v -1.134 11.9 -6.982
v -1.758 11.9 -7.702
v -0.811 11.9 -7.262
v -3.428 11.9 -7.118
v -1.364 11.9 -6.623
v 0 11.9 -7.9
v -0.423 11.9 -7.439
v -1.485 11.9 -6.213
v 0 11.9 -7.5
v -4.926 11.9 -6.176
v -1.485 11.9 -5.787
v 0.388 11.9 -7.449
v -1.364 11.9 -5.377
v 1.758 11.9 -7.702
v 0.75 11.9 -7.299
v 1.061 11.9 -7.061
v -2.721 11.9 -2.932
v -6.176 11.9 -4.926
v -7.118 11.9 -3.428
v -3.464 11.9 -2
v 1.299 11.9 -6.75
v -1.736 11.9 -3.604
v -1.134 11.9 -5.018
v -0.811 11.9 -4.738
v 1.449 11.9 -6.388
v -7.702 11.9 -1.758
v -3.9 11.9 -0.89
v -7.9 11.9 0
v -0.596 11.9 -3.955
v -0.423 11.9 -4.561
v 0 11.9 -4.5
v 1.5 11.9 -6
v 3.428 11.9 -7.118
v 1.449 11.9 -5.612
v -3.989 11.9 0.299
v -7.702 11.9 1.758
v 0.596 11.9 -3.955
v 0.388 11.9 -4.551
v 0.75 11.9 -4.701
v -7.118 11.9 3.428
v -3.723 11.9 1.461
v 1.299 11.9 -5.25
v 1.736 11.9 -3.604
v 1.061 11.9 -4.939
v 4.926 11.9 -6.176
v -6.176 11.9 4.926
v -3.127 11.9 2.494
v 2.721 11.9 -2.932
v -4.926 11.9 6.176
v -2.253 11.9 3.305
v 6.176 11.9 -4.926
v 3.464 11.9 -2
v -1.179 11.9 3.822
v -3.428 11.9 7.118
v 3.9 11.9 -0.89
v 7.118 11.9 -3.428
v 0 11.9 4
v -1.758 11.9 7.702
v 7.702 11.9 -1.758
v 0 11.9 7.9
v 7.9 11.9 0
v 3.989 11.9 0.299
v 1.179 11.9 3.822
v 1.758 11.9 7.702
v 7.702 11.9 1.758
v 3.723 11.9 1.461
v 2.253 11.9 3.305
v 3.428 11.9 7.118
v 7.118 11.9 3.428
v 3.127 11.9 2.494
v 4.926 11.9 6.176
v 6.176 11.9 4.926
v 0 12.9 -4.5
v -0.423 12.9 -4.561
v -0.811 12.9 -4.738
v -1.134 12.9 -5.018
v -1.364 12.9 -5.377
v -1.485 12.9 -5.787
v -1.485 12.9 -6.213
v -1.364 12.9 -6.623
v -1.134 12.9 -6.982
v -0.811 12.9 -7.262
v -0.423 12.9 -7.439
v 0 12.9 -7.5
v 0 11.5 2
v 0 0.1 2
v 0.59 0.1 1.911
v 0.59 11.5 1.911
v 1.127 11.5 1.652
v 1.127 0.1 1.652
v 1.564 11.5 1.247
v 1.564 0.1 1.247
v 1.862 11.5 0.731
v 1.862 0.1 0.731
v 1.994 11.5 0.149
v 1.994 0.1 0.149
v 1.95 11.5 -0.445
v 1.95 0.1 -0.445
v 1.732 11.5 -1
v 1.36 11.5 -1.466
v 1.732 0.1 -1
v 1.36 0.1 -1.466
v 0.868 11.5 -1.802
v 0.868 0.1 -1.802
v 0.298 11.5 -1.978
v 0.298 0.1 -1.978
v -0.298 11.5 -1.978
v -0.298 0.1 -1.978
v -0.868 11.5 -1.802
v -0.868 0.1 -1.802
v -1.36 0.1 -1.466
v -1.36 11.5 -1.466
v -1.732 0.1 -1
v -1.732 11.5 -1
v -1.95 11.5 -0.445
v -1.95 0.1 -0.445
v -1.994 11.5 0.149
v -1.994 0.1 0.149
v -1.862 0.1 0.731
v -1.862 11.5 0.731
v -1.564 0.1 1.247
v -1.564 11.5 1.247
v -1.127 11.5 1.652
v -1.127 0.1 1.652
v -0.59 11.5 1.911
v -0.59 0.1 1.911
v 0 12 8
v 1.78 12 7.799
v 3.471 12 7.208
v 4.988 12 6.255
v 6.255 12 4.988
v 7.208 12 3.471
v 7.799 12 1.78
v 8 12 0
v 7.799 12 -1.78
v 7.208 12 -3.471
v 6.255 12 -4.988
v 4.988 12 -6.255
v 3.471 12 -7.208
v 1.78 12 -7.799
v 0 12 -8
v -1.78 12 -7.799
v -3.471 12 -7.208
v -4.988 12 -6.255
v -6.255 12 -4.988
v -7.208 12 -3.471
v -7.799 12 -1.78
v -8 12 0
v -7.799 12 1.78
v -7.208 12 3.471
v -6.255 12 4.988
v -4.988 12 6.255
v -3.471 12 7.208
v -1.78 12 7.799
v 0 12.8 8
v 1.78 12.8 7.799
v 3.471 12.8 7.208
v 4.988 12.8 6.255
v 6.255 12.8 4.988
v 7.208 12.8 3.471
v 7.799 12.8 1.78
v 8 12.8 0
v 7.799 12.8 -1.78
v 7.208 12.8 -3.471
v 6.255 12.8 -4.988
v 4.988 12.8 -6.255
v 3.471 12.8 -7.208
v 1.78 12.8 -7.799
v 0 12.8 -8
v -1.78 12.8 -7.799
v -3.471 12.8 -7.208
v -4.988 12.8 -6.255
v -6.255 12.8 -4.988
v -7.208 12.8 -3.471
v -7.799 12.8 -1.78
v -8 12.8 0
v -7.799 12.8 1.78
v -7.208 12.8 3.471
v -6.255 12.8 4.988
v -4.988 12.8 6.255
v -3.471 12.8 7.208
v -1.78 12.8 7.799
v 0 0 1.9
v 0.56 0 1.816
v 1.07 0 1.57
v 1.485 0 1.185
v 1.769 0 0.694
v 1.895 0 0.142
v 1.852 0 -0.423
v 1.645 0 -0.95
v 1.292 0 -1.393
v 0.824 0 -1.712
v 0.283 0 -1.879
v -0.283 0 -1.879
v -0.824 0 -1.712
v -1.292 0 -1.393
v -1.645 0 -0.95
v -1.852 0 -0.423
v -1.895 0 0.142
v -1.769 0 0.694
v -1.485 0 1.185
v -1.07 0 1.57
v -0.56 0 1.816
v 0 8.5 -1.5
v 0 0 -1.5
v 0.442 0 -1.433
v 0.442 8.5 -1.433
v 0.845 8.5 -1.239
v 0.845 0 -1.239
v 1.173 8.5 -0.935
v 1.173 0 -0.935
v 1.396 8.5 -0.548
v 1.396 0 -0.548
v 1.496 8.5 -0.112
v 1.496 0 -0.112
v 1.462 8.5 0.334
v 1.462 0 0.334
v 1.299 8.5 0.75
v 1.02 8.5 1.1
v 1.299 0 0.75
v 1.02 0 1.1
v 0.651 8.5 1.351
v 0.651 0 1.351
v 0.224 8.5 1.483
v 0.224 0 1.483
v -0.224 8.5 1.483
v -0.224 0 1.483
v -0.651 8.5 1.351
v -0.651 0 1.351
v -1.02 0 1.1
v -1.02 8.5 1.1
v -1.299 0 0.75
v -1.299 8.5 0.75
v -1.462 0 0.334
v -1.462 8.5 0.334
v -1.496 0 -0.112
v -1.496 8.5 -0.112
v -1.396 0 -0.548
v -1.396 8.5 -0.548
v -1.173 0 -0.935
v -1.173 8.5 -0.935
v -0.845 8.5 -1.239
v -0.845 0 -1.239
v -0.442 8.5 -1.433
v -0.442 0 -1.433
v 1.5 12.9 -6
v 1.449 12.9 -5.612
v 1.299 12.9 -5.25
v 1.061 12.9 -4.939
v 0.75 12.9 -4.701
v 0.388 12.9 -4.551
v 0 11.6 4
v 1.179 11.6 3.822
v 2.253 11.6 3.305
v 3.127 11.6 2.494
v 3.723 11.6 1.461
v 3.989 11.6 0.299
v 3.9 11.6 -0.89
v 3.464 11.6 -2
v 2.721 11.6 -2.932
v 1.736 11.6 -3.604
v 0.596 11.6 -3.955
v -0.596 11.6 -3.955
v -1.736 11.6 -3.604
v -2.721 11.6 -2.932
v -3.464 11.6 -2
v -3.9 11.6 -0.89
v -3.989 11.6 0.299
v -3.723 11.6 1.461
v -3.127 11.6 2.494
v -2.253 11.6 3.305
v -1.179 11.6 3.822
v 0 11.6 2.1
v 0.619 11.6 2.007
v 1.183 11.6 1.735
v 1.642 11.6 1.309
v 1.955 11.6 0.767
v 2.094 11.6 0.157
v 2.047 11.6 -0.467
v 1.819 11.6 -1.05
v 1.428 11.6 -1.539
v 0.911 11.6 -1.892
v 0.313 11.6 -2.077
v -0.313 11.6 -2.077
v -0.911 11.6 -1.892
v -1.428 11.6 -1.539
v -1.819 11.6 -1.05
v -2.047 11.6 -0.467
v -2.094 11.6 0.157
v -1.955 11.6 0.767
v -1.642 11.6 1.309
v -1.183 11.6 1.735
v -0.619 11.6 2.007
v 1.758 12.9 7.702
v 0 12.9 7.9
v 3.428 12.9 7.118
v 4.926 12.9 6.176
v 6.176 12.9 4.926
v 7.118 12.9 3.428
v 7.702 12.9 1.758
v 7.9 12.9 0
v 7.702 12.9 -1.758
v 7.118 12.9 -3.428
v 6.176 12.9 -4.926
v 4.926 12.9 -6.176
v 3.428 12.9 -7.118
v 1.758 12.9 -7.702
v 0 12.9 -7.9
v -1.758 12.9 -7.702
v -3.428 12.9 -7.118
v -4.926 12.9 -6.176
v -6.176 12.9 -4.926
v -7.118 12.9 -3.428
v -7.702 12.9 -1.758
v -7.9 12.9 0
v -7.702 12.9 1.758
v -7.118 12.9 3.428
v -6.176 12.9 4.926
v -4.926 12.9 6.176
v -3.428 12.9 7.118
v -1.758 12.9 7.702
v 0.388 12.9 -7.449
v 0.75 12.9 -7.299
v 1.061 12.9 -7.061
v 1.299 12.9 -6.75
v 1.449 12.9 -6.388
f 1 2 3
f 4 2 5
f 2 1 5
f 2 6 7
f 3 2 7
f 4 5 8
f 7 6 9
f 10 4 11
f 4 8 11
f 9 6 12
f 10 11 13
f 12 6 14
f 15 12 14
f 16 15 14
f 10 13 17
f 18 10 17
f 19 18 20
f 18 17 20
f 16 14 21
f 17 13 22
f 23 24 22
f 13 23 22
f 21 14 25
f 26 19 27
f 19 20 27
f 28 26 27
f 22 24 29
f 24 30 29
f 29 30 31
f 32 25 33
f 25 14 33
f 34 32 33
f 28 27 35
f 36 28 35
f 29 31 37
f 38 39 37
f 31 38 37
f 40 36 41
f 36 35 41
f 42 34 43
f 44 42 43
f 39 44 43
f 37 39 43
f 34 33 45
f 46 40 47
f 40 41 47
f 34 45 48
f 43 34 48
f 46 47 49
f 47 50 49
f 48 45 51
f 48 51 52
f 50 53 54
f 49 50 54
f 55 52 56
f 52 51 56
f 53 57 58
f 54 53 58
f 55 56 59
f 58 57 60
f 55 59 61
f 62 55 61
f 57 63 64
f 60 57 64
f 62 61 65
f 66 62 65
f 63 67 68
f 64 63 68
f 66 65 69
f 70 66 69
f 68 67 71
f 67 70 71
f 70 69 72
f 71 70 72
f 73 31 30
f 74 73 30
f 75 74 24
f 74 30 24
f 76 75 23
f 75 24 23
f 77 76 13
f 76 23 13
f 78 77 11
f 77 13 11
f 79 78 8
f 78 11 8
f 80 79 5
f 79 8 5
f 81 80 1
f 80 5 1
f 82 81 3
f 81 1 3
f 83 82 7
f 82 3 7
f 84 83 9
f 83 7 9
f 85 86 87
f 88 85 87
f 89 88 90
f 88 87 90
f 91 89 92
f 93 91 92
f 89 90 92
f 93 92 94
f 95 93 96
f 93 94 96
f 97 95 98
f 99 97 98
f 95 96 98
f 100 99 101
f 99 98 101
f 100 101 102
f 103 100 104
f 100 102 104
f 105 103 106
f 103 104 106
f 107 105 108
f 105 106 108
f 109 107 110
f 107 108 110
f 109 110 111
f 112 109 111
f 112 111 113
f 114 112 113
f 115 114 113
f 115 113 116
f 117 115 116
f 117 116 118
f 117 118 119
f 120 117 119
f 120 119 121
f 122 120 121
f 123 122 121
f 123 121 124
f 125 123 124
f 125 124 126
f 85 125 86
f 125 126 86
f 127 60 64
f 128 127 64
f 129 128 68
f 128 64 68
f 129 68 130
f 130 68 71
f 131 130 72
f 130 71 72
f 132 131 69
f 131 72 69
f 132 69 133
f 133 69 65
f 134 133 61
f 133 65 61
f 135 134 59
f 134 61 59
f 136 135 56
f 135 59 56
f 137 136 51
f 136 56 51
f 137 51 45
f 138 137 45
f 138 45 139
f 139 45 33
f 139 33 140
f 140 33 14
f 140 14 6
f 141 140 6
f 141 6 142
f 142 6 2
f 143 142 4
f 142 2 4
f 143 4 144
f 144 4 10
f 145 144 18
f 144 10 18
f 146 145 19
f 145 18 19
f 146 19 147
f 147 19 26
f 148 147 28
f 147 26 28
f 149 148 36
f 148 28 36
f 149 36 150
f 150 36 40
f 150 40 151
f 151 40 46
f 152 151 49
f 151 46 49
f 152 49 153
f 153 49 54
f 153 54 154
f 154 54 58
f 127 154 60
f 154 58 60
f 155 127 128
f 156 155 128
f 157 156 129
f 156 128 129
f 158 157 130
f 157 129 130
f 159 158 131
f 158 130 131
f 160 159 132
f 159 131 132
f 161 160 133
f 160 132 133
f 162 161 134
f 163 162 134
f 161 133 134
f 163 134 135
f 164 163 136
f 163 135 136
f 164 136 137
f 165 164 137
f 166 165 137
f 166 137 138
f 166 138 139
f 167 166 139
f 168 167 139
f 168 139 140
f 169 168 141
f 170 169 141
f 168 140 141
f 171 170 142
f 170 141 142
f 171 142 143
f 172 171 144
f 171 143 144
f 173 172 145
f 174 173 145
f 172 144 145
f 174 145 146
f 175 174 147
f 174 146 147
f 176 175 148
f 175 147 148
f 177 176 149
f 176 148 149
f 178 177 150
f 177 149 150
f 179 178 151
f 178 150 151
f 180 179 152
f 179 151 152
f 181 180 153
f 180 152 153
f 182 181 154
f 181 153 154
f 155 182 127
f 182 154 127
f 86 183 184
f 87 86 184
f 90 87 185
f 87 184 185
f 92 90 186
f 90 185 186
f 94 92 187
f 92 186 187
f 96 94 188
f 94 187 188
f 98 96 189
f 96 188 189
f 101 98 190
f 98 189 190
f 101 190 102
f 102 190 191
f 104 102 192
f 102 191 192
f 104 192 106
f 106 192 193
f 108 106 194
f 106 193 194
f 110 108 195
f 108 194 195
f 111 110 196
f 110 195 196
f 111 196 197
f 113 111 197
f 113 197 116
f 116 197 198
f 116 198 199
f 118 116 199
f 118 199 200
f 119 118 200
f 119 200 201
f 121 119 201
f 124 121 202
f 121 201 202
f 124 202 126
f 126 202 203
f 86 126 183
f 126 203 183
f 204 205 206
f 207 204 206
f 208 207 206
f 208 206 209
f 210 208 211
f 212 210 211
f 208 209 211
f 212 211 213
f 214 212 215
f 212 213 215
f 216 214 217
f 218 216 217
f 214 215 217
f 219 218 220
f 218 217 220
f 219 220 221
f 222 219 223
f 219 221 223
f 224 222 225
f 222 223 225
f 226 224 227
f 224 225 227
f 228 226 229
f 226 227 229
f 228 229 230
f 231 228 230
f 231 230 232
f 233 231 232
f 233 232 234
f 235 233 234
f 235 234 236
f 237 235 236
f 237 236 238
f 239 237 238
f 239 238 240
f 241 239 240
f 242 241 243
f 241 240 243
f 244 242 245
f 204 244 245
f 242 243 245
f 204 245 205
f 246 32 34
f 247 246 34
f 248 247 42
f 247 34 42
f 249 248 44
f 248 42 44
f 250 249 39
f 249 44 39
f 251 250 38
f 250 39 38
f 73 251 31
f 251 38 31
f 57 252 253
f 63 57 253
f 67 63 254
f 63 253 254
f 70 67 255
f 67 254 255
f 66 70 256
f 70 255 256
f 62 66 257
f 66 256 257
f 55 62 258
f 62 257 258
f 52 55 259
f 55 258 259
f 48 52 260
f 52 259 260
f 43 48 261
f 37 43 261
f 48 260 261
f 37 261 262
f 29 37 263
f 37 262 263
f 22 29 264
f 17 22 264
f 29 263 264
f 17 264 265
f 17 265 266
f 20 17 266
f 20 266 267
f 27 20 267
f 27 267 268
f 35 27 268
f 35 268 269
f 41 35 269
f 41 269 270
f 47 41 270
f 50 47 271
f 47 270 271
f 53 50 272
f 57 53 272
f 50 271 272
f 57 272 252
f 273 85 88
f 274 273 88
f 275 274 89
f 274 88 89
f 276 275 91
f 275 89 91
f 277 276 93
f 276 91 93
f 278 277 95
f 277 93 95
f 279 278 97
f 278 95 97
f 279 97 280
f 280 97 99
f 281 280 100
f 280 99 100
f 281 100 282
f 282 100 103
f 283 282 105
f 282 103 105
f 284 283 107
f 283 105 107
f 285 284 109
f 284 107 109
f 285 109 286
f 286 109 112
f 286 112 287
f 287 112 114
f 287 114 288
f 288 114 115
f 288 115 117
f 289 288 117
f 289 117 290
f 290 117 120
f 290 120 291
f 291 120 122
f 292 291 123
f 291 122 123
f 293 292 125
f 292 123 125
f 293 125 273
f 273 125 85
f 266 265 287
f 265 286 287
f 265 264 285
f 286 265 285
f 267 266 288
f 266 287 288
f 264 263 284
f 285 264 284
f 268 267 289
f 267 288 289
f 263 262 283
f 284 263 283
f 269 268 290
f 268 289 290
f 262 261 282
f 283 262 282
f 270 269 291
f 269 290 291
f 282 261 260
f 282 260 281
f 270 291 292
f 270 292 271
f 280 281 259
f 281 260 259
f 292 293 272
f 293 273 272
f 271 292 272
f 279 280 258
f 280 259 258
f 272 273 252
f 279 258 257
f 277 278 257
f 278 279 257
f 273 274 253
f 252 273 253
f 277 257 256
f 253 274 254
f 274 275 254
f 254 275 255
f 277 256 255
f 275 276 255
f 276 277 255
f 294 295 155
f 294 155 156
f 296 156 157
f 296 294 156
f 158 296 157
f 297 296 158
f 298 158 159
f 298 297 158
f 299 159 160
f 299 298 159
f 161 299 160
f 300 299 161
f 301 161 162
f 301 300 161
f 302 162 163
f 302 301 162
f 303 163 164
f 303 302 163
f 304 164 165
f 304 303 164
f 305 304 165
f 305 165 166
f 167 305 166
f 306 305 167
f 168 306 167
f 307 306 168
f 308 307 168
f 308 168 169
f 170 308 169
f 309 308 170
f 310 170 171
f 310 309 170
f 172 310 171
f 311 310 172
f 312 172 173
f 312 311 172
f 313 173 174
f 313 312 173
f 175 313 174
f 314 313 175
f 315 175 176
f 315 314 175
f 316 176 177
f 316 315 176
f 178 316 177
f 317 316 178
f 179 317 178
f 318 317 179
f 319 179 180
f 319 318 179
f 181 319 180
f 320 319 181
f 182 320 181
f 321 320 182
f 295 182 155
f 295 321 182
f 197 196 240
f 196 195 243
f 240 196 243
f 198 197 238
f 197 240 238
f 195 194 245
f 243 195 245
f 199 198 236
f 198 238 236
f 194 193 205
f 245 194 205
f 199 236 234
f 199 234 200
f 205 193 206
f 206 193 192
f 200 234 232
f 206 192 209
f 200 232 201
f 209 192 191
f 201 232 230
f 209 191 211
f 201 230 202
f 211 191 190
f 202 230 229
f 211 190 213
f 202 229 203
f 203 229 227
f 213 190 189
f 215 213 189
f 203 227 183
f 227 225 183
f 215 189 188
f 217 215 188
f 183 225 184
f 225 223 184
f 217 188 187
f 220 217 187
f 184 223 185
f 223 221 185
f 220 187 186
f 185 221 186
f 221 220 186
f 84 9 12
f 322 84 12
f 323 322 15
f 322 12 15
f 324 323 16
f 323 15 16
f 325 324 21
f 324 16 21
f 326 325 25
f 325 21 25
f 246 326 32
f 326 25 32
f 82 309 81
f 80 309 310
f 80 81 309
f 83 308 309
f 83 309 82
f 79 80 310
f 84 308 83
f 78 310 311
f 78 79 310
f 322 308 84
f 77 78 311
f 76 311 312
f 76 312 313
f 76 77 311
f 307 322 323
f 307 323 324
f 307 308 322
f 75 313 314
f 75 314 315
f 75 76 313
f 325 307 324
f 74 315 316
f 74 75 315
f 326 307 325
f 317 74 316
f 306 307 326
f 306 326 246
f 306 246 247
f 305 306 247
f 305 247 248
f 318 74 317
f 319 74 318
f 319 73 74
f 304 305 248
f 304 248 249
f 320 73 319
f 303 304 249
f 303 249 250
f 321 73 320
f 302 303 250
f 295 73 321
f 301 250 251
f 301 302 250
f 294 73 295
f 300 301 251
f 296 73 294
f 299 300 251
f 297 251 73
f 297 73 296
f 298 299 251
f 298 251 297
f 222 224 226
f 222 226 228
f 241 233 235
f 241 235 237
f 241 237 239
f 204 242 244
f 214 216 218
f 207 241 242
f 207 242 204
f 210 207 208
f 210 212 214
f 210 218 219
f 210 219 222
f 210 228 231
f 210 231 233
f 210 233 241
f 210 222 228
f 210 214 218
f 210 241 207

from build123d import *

# Parameters (mm, degrees)
SKETCH1_R           = 2
BOSS_EXTRUDE1_DEPTH = 11.6
SKETCH2_R           = 4
BOSS_EXTRUDE2_DEPTH = 0.3
SKETCH3_R           = 8
BOSS_EXTRUDE3_DEPTH = 1
SKETCH4_R           = 1.5
CUT_EXTRUDE1_DEPTH  = 8.5
CUT_EXTRUDE2_DEPTH  = 17.419805115
CHAMFER1_SIZE       = 0.1


with BuildPart() as part:
    # Sketch1 → Boss-Extrude1 (new body)
    with BuildSketch(Plane(origin=(0, 0, 0), x_dir=(1, 0, 0), z_dir=(0, 1, 0))):
        with Locations(Location((0, 0, 0), (0, 0, 270))):
            Circle(SKETCH1_R)
    extrude(amount=BOSS_EXTRUDE1_DEPTH)

    # Sketch2 → Boss-Extrude2 (add)
    with BuildSketch(Plane(origin=(0, 11.6, 0), x_dir=(1, 0, 0), z_dir=(0, 1, 0))):
        with Locations(Location((0, 0, 0), (0, 0, 270))):
            Circle(SKETCH2_R)
    extrude(amount=BOSS_EXTRUDE2_DEPTH)

    # Sketch3 → Boss-Extrude3 (add)
    with BuildSketch(Plane(origin=(0, 11.9, 0), x_dir=(1, 0, 0), z_dir=(0, 1, 0))):
        with Locations(Location((0, 0, 0), (0, 0, 270))):
            Circle(SKETCH3_R)
    extrude(amount=BOSS_EXTRUDE3_DEPTH)

    # Sketch4 → Cut-Extrude1 (cut)
    with BuildSketch(Plane.XZ):
        with Locations(Location((0, 0, 0), (0, 0, 270))):
            Circle(SKETCH4_R)
    extrude(amount=-CUT_EXTRUDE1_DEPTH, mode=Mode.SUBTRACT)

    # Sketch5 → Cut-Extrude2 (cut, through all)
    with BuildSketch(Plane.XZ.offset(-11.9)):
        with BuildLine():
            ThreePointArc((1.5, -6), (1.060660172, -4.939339828), (0, -4.5))
            Line((0, -4.5), (0, -7.5))
            ThreePointArc((0, -7.5), (1.060660172, -7.060660172), (1.5, -6))
        make_face()
        with BuildLine():
            Line((0, -7.5), (0, -4.5))
            ThreePointArc((0, -4.5), (-1.5, -6), (0, -7.5))
        make_face()
    extrude(amount=-CUT_EXTRUDE2_DEPTH, mode=Mode.SUBTRACT)

    # Chamfer1
    chamfer1_edges = [part.edges().sort_by_distance(p)[0] for p in [
        (0, 12.9, -8),
        (0, 0, -2),
        (0, 11.6, -2),
        (0, 11.9, -8),
    ]]
    chamfer(chamfer1_edges, length=CHAMFER1_SIZE)


solid = part.part
